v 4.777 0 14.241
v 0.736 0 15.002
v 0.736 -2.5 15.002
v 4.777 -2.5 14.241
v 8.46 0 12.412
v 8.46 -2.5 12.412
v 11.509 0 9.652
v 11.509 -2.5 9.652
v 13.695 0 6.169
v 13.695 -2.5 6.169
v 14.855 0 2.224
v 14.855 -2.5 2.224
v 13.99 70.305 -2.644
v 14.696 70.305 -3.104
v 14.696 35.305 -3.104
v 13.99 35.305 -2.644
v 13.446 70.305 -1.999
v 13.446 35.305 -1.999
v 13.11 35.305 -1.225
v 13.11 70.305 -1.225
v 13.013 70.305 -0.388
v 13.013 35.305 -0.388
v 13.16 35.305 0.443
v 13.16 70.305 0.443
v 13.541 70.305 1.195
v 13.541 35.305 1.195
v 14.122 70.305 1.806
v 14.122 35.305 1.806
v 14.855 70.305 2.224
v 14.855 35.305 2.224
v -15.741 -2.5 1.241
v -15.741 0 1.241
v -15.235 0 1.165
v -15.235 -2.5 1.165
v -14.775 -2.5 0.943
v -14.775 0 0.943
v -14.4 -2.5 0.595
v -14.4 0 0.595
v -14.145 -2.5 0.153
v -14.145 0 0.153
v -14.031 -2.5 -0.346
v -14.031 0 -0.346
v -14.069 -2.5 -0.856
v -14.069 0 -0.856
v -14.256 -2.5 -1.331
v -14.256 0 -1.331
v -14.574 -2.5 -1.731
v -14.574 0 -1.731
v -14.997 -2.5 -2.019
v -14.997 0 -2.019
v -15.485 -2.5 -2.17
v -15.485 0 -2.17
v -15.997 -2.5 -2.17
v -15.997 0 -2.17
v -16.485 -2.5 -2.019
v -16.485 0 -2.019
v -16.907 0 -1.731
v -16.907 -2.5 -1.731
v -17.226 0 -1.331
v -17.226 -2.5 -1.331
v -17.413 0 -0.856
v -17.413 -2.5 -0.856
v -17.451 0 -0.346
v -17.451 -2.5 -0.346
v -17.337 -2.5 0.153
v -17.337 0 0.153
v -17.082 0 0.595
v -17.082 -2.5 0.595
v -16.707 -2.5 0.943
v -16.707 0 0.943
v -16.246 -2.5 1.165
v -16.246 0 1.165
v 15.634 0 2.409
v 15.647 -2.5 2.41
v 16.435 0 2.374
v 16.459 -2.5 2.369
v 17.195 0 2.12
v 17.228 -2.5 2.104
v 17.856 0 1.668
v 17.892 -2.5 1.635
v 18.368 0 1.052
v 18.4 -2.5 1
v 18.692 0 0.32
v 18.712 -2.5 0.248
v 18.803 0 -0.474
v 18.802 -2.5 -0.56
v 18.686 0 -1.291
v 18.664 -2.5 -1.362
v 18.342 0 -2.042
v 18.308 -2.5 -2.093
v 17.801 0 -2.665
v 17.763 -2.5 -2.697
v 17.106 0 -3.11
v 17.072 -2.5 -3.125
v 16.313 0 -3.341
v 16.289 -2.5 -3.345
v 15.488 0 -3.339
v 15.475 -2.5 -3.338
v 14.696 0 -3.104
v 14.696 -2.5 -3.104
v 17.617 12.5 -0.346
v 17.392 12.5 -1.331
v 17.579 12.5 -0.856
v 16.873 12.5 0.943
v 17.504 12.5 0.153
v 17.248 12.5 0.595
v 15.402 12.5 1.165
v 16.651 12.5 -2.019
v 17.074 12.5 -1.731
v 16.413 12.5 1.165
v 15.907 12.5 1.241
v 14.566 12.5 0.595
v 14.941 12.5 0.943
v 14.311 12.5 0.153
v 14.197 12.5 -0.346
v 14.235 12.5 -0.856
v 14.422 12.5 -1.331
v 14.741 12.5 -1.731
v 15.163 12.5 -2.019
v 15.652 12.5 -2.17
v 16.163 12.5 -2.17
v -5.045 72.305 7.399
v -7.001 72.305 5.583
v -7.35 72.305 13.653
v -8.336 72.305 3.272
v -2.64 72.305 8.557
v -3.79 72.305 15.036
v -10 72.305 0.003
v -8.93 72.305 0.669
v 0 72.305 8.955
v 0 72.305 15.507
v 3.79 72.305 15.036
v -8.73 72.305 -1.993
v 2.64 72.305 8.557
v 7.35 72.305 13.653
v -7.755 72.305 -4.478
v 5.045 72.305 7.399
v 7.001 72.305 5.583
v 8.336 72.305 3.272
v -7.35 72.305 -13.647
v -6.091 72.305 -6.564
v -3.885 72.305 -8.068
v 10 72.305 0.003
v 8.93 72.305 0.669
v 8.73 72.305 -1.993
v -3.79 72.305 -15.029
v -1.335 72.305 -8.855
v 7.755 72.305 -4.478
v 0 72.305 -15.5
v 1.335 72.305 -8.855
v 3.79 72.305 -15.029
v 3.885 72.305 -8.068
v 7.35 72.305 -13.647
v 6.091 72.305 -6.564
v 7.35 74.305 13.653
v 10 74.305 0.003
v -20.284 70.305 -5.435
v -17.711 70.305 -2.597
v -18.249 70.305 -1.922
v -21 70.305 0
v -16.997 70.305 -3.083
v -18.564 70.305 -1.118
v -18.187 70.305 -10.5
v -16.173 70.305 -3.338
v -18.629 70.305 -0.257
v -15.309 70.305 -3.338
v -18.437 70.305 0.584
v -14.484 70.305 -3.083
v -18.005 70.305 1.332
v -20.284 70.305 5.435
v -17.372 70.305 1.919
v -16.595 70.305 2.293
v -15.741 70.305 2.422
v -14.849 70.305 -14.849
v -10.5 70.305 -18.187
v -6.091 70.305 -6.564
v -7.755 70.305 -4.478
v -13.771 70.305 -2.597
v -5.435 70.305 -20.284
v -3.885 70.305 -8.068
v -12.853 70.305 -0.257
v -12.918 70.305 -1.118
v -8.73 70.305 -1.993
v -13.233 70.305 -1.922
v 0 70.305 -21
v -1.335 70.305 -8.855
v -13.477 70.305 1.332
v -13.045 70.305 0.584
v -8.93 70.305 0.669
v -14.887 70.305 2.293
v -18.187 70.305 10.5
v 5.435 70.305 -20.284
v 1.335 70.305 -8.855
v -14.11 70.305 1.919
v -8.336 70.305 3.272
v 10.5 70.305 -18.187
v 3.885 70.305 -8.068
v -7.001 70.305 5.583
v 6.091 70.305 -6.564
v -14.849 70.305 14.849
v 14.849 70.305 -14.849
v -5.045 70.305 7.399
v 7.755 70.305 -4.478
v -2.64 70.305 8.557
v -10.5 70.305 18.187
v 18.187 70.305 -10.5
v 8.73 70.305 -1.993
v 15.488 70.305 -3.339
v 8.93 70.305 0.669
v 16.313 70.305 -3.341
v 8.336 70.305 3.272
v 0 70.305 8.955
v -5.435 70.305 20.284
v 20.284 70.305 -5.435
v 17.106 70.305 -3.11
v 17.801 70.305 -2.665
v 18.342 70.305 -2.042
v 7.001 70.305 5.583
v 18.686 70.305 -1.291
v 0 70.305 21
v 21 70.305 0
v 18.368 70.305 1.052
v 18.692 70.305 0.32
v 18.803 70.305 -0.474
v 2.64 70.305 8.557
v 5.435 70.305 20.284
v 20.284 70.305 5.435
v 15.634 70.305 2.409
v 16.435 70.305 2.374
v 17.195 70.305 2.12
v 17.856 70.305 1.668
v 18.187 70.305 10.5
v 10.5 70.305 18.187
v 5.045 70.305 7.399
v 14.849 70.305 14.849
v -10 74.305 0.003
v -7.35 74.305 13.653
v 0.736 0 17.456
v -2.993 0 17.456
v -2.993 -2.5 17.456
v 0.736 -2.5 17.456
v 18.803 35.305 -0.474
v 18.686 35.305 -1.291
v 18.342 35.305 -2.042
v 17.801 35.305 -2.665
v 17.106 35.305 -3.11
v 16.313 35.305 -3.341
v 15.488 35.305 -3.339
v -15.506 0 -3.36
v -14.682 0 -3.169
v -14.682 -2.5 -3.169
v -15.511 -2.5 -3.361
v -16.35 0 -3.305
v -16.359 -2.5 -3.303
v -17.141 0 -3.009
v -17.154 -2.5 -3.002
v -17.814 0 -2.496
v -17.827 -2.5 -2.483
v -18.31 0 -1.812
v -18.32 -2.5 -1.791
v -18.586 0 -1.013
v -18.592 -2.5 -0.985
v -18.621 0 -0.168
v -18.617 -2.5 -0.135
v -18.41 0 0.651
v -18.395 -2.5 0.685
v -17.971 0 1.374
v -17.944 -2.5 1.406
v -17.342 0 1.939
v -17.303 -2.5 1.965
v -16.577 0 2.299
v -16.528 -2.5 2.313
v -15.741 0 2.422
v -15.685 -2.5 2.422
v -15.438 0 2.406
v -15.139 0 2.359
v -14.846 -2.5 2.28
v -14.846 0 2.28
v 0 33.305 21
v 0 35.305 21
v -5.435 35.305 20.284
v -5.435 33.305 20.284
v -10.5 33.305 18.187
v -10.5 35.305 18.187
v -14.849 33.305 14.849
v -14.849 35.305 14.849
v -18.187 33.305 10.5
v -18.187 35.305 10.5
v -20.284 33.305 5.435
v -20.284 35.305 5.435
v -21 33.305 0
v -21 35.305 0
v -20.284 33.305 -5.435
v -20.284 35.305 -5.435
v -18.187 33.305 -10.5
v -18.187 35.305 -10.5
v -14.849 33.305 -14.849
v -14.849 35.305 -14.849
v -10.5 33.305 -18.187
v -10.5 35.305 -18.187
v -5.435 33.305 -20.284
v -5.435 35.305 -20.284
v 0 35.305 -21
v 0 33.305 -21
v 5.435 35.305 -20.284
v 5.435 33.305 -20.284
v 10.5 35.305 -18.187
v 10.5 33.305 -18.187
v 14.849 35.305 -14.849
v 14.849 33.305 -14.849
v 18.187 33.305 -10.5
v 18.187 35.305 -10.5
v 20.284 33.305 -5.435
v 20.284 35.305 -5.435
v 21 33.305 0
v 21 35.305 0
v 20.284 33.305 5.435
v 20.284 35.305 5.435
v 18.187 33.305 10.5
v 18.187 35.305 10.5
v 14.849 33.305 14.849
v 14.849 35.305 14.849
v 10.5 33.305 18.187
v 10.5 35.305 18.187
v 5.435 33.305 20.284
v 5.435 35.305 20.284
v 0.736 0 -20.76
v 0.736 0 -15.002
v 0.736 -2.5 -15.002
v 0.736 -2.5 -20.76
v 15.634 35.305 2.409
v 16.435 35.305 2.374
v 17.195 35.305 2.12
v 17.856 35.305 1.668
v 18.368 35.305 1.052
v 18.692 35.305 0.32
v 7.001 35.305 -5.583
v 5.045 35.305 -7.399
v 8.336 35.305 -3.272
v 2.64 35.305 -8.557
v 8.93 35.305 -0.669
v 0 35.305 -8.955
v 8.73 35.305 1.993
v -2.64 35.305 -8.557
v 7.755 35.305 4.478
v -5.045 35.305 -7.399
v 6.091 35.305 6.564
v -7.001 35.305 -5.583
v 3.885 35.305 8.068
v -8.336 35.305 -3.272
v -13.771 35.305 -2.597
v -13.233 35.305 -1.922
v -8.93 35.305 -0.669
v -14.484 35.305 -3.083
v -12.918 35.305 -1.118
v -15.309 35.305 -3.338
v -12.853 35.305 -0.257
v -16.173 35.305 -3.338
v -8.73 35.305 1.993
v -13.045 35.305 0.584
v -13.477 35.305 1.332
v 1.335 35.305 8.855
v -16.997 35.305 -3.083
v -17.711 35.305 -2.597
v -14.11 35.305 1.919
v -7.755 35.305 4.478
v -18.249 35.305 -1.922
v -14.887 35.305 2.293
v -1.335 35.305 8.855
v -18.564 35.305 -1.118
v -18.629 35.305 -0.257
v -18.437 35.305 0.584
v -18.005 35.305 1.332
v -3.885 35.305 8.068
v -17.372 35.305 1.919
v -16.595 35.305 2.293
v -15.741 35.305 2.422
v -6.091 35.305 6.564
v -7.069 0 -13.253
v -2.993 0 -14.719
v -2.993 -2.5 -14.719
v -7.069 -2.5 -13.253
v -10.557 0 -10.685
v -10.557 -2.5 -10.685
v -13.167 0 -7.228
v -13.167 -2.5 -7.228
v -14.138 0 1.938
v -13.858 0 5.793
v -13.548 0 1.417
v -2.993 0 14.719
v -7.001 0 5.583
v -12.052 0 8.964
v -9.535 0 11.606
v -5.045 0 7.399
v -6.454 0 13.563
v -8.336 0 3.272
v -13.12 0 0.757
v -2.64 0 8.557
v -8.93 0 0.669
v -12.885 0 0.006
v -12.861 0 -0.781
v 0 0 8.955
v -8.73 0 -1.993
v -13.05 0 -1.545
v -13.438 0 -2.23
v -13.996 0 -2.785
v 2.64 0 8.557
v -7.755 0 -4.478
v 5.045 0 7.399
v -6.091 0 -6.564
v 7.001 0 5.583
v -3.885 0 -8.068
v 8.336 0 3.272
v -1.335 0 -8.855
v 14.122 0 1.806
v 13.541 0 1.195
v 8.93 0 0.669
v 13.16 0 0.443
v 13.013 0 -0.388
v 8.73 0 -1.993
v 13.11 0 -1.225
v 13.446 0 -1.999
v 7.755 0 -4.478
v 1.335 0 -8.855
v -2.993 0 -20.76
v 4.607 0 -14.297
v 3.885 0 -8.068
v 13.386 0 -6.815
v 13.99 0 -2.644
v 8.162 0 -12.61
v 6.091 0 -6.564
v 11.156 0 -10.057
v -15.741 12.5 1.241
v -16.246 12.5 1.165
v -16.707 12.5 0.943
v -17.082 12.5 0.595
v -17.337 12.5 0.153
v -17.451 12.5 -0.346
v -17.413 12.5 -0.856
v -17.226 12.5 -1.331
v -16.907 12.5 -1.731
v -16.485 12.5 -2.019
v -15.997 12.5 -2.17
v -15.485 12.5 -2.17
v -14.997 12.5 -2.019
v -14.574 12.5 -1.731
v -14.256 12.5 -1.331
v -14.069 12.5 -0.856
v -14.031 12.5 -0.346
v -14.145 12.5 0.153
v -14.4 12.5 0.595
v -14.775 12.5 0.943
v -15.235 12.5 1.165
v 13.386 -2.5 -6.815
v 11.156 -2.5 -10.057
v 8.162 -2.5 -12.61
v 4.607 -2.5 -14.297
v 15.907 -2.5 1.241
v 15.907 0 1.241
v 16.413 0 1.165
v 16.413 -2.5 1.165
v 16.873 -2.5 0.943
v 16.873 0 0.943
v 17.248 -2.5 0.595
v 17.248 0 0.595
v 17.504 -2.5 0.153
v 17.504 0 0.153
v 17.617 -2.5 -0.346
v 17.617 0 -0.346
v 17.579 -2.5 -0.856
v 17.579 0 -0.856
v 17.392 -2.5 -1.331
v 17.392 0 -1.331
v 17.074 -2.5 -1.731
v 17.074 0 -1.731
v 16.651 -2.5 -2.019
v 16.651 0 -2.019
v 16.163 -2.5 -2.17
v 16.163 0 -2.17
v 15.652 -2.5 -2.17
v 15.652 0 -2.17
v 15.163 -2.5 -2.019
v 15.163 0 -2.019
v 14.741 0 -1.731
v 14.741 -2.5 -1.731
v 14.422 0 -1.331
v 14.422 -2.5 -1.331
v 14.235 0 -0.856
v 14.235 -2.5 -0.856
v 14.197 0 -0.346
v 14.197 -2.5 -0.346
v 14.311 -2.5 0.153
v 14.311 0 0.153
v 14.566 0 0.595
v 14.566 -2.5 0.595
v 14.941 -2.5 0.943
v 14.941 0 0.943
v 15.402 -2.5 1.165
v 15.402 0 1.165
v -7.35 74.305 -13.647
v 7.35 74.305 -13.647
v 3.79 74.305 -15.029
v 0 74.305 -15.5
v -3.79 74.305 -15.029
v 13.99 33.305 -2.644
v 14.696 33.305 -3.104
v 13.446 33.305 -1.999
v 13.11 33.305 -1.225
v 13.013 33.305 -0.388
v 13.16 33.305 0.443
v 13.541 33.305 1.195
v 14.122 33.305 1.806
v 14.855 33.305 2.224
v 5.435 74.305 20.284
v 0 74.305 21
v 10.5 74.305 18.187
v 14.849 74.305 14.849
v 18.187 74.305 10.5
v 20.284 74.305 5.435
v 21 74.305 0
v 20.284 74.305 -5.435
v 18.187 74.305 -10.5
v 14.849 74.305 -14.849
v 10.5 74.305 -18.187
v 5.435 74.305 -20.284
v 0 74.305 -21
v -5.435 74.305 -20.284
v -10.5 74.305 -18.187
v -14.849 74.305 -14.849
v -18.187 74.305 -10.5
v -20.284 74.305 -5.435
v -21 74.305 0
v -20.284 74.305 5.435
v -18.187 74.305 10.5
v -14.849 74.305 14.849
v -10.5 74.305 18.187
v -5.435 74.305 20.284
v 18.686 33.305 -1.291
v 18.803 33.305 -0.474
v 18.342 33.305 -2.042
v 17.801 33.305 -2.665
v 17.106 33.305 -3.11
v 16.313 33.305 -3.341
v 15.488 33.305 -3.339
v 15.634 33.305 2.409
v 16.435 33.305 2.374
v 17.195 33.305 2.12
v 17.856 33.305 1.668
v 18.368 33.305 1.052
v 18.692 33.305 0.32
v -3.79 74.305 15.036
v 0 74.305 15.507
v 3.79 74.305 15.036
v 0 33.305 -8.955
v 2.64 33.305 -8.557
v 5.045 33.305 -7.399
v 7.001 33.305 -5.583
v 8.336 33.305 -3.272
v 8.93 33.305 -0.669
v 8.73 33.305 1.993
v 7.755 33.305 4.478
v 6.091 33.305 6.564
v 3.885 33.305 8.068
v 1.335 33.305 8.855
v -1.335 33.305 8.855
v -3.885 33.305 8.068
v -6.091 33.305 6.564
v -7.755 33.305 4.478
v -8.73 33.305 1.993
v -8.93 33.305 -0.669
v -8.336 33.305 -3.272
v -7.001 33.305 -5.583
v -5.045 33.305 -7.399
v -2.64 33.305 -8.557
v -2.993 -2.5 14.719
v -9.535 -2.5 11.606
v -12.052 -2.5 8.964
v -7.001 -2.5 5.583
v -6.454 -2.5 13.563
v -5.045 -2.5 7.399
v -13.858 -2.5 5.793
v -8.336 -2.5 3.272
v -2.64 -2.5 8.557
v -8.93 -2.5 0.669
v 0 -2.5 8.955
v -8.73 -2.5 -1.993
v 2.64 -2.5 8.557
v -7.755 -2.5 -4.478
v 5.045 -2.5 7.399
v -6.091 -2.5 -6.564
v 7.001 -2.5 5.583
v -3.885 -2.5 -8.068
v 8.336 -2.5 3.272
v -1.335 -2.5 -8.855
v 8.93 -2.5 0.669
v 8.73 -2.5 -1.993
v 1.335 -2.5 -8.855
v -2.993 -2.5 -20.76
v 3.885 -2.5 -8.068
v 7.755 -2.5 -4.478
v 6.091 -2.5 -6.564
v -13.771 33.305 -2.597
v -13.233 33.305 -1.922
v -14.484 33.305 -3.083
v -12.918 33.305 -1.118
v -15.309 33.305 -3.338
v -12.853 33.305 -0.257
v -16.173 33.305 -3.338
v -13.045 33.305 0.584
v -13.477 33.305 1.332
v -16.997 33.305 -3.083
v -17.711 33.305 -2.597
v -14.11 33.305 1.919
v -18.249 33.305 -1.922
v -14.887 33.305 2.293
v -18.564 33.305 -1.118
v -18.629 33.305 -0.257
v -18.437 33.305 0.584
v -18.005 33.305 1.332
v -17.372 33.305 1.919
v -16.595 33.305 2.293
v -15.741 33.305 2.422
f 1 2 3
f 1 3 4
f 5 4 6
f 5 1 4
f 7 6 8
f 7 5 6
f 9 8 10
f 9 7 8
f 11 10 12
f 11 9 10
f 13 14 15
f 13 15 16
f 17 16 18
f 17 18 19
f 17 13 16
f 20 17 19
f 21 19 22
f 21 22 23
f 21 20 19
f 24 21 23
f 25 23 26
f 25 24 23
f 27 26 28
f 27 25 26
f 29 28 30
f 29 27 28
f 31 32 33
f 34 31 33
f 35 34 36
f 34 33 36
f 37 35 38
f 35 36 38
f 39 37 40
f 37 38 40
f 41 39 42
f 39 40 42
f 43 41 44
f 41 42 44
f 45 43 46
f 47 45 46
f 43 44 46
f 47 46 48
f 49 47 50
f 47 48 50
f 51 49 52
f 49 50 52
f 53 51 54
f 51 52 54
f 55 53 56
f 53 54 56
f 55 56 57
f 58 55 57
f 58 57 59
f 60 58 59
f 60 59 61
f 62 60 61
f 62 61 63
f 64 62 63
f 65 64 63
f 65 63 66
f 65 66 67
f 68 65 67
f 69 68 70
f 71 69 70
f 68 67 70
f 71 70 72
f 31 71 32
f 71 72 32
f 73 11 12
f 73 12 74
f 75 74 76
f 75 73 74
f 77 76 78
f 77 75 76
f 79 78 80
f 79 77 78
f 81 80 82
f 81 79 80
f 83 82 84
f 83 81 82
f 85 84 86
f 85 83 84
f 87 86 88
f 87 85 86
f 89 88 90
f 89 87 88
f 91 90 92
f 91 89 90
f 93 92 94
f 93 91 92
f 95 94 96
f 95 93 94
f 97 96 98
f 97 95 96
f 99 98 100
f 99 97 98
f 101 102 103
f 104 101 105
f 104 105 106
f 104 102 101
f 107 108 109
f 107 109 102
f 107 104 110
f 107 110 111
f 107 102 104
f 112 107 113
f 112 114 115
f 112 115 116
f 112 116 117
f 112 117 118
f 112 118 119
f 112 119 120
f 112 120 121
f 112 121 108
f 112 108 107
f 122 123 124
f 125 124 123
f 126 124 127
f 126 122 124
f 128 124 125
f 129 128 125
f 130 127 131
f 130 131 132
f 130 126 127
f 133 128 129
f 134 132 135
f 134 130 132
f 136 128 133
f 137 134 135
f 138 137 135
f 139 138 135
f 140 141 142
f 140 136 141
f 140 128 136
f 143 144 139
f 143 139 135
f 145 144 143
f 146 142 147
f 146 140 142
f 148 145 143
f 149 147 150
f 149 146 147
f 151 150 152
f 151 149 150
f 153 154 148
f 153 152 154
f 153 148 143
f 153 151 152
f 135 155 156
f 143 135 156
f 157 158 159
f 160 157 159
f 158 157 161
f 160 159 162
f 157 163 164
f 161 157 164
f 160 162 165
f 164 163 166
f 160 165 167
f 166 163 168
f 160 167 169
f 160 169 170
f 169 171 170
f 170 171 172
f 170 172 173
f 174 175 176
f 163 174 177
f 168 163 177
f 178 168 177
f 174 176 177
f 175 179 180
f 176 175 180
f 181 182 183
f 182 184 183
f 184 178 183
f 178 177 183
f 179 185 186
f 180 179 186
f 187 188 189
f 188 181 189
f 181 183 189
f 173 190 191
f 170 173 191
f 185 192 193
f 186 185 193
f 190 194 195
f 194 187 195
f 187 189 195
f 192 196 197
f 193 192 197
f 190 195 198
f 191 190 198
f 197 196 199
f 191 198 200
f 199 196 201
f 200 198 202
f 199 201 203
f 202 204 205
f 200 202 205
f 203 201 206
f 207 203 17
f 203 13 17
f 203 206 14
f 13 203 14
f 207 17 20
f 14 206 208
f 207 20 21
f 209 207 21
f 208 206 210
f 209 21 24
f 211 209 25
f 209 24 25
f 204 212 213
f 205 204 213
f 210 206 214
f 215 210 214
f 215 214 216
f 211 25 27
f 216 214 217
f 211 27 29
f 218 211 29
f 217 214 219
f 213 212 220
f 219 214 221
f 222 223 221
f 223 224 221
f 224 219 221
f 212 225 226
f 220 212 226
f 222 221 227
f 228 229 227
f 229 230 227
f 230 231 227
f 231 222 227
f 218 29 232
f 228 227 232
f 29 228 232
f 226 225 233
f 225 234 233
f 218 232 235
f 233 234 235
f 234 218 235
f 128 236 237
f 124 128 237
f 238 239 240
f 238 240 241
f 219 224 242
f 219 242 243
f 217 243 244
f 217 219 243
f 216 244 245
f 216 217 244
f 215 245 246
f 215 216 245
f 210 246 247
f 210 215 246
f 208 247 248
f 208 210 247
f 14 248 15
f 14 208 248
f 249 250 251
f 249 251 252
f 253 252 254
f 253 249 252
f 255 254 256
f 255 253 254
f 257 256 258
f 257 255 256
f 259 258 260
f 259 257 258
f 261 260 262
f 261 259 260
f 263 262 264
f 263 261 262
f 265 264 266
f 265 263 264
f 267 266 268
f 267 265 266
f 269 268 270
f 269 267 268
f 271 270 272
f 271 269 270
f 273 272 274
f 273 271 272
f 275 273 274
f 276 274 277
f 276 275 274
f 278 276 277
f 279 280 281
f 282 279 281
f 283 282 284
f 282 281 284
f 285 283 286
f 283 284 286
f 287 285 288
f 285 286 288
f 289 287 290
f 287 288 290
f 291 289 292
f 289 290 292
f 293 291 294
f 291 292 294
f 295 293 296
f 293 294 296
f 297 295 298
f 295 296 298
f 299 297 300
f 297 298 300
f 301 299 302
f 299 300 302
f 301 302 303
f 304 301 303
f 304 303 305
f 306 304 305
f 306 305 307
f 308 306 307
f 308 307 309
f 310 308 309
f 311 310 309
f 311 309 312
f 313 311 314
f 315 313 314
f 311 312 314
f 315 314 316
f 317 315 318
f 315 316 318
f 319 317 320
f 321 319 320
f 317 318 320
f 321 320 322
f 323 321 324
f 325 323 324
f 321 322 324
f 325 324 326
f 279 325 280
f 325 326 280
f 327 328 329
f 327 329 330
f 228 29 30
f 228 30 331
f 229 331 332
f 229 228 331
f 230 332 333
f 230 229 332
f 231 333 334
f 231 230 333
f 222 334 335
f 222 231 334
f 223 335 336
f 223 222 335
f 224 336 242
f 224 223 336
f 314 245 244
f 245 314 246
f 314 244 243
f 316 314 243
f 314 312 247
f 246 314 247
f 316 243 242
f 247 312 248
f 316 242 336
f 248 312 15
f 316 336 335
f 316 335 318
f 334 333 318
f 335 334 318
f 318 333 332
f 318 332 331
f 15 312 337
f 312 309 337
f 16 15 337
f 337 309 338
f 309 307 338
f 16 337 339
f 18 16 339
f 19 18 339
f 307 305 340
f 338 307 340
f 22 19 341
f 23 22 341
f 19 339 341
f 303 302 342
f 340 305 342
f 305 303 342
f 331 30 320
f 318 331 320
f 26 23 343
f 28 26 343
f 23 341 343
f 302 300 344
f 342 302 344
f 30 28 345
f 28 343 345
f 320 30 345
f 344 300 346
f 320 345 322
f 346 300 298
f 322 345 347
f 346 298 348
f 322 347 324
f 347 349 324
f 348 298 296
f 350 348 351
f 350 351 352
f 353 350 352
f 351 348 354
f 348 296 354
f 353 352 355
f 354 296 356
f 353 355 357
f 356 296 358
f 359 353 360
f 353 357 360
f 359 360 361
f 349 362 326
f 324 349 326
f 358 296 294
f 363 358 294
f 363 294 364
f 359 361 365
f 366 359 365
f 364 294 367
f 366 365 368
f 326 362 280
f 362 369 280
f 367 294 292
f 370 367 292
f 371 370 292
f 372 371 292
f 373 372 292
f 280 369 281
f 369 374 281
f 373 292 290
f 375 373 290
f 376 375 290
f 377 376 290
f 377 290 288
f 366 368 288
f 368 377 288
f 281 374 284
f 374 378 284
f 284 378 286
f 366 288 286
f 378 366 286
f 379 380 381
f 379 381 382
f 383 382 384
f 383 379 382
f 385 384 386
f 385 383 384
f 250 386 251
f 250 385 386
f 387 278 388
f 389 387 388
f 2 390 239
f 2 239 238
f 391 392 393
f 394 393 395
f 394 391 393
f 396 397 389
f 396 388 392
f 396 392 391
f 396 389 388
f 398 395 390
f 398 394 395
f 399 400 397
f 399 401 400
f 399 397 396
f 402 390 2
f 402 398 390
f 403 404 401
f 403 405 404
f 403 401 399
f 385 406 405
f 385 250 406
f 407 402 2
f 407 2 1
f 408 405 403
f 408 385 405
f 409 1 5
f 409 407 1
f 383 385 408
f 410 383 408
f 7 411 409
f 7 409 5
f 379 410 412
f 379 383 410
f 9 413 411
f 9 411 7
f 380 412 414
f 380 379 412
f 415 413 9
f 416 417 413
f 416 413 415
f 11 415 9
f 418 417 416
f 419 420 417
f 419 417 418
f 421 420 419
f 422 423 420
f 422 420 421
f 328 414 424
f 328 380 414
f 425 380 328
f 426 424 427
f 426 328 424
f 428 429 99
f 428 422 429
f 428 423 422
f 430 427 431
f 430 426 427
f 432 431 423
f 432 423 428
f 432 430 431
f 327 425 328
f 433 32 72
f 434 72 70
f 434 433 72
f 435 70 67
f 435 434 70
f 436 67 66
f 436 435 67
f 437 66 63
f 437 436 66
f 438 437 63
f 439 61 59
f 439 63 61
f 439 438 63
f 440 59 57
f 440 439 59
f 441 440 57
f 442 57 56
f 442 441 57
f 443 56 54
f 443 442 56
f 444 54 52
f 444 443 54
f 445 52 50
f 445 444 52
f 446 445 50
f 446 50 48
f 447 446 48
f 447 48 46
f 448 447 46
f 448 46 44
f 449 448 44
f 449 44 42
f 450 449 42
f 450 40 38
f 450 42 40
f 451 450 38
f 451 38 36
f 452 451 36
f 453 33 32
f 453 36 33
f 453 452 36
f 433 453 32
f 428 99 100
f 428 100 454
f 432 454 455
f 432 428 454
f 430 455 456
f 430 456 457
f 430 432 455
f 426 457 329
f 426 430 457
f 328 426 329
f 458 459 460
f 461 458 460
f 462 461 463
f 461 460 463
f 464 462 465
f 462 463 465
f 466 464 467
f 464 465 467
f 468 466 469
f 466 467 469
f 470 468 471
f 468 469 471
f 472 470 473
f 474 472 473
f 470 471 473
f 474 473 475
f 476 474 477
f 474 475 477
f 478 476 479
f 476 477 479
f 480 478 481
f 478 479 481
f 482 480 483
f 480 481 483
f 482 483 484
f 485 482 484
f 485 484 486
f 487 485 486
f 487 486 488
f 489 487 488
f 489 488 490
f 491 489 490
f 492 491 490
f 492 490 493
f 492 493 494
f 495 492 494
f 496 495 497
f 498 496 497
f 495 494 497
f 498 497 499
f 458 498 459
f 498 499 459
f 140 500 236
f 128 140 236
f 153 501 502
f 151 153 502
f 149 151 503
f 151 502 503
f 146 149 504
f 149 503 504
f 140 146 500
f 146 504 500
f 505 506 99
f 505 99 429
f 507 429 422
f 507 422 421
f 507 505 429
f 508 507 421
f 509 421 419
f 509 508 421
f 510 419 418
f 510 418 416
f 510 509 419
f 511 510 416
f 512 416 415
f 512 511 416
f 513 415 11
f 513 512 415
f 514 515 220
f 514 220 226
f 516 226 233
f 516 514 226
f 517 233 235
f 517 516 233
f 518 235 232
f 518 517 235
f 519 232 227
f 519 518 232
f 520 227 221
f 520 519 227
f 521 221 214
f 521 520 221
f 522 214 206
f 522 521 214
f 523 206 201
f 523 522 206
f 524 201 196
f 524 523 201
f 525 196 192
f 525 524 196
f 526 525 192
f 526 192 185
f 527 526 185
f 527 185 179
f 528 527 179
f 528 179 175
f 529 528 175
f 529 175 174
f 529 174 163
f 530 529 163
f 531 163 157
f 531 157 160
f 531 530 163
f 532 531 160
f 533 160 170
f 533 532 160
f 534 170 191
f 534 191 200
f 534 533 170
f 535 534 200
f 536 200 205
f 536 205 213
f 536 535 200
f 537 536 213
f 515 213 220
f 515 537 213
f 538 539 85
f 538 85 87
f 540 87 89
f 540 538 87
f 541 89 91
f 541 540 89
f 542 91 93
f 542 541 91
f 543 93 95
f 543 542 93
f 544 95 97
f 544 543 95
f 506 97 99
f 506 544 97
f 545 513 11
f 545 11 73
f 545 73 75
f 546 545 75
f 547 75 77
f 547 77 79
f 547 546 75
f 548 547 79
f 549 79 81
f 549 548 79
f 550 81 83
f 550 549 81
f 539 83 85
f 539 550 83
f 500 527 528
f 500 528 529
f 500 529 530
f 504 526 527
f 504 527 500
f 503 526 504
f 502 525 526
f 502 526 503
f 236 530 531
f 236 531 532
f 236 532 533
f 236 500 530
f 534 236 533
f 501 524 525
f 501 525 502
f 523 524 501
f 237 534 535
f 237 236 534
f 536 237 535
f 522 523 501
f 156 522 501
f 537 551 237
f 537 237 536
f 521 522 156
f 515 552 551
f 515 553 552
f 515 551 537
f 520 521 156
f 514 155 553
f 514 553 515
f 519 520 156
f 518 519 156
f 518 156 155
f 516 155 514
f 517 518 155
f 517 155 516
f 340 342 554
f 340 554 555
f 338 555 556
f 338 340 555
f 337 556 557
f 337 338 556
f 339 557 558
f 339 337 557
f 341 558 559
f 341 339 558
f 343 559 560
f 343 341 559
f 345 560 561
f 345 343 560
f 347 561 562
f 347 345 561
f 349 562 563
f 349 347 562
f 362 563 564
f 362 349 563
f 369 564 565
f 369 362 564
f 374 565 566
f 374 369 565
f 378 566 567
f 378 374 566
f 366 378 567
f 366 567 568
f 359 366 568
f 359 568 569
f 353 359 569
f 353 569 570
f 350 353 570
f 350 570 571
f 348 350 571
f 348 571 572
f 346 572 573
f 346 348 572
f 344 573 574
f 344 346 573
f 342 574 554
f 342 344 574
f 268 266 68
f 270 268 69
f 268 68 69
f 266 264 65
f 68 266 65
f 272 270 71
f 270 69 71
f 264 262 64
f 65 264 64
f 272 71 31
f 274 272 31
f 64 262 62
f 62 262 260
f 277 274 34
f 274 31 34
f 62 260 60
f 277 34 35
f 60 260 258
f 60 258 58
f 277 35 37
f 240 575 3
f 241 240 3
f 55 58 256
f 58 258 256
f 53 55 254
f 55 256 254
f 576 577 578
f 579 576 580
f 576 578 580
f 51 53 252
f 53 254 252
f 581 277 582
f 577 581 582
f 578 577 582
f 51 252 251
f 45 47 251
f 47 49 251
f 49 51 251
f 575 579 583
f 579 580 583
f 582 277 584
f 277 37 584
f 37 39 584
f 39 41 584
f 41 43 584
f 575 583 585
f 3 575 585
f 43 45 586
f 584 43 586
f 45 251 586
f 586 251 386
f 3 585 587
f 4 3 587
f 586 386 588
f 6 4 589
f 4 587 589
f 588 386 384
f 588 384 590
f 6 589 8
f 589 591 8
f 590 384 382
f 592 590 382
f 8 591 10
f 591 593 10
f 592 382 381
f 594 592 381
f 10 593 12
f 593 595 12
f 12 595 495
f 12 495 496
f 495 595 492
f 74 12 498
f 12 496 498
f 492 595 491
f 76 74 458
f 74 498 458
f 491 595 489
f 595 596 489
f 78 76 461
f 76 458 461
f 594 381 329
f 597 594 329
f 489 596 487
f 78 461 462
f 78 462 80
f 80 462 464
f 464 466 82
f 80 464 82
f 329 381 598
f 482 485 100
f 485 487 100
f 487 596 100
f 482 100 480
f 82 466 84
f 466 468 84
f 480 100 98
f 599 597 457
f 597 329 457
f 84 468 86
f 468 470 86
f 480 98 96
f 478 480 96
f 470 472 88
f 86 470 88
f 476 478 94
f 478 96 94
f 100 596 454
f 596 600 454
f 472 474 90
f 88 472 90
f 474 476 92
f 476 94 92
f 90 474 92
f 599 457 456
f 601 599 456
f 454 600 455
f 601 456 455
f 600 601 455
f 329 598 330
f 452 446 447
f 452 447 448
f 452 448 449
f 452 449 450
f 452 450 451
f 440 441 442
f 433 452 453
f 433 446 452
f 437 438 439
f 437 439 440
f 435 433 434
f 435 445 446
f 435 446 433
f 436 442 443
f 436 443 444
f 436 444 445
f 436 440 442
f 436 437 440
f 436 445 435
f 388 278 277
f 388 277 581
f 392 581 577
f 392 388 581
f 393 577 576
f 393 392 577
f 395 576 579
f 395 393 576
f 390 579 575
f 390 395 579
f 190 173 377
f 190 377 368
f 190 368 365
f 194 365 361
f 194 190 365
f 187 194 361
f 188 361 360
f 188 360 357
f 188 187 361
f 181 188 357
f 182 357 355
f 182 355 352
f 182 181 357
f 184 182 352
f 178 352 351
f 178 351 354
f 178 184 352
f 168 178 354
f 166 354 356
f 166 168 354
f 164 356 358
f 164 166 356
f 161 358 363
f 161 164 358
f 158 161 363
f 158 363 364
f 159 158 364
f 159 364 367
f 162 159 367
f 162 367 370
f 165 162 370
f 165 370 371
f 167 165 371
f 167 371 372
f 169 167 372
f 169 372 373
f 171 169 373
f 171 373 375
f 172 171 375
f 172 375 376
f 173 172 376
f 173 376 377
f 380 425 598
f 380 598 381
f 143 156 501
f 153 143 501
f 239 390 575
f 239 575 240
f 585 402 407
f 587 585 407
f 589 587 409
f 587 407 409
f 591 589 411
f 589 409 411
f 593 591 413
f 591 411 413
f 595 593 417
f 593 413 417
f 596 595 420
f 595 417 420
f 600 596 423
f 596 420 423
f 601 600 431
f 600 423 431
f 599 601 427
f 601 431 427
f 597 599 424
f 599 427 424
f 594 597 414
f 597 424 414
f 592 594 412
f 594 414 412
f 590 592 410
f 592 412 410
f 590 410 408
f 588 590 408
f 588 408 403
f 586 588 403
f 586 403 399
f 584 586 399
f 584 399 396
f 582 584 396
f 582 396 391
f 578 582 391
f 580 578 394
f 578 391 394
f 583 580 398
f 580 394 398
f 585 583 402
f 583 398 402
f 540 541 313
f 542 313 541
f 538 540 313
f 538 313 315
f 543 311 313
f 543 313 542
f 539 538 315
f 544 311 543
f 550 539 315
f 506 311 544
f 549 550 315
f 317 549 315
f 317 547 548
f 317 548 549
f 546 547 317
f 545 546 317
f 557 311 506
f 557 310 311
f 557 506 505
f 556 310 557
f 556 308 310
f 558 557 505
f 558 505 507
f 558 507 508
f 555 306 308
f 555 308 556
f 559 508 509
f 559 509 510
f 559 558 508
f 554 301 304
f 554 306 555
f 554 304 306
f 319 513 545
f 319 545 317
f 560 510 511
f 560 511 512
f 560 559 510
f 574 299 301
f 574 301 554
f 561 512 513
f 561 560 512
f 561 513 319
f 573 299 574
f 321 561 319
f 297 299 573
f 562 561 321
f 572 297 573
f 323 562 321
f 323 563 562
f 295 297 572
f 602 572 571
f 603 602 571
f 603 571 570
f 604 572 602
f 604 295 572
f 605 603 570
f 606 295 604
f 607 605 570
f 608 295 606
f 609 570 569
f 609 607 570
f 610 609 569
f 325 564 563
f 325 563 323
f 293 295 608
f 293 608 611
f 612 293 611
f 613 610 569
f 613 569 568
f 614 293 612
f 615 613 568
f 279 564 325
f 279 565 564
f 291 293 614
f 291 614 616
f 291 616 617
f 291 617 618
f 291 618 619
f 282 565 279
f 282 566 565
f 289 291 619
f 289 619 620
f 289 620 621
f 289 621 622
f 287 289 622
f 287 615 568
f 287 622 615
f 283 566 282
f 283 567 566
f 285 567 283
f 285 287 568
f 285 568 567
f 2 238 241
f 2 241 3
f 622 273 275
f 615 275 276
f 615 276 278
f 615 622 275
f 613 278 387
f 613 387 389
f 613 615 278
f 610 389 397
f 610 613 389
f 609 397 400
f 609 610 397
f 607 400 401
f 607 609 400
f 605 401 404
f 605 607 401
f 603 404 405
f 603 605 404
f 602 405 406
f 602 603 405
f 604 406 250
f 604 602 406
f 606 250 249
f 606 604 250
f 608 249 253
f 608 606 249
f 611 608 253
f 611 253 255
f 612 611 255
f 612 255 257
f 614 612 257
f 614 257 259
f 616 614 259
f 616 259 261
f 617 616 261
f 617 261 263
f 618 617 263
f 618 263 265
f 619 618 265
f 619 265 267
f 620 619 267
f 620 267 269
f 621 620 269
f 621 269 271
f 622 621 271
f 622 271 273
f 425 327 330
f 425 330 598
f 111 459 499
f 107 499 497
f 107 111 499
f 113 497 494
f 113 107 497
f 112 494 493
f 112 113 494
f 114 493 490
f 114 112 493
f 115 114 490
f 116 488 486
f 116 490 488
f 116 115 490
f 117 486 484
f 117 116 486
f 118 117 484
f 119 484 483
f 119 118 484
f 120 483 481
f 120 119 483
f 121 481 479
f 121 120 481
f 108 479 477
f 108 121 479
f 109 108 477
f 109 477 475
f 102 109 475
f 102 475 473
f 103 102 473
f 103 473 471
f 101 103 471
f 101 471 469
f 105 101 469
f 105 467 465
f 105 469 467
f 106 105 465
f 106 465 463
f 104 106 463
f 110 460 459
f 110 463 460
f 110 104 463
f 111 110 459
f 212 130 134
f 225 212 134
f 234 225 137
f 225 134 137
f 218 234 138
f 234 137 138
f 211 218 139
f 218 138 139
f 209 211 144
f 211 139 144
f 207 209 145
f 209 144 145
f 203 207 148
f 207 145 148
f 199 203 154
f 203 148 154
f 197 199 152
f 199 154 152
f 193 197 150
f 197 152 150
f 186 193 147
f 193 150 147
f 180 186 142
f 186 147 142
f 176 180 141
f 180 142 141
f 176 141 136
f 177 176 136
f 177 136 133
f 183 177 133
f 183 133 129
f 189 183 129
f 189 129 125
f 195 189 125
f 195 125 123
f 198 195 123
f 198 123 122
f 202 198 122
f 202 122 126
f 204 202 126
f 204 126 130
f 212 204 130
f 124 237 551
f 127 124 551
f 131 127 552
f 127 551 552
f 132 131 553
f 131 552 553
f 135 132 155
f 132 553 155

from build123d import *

# Parameters (mm, degrees)
SKETCH2_R           = 1.715
SKETCH2_R_2         = 8.955
BOSS_EXTRUDE1_DEPTH = 2.5
BOSS_EXTRUDE2_START = 70.305
SKETCH3_R           = 1.715
SKETCH3_R_2         = 2.896004293
BOSS_EXTRUDE2_DEPTH = 70.305
BOSS_EXTRUDE3_START = 4
SKETCH4_R           = 21
SKETCH4_R_2         = 8.955
BOSS_EXTRUDE3_DEPTH = 4
CUT_EXTRUDE1_DEPTH  = 2
SKETCH6_R           = 21
SKETCH6_R_2         = 8.955
BOSS_EXTRUDE4_DEPTH = 2
CUT_EXTRUDE2_START  = -15
SKETCH7_R           = 1.715
CUT_EXTRUDE2_DEPTH  = 15


with BuildPart() as part:
    # Sketch2 → Boss-Extrude1 (new body)
    with BuildSketch(Plane(origin=(0, 0, 0), x_dir=(1, 0, 0), z_dir=(0, 1, 0))):
        with BuildLine():
            ThreePointArc((14.854844323, -2.224127391), (18.801958936, 0.560128045), (14.69610016, 3.104477828))
            ThreePointArc((14.69610016, 3.104477828), (9.742901135, 11.431929845), (0.735551003, 15.002403382))
            Line((0.735551003, 15.002403382), (0.735551003, 20.759778141))
            Line((0.735551003, 20.759778141), (-2.9930124, 20.759778141))
            Line((-2.9930124, 20.759778141), (-2.9930124, 14.719205797))
            ThreePointArc((-2.9930124, 14.719205797), (-10.557124207, 10.684580992), (-14.68222924, 3.169430082))
            ThreePointArc((-14.68222924, 3.169430082), (-18.635653921, 0.561038173), (-14.846301483, -2.280454949))
            ThreePointArc((-14.846301483, -2.280454949), (-10.873863647, -10.362057319), (-2.9930124, -14.719205797))
            Line((-2.9930124, -14.719205797), (-2.9930124, -17.45639334))
            Line((-2.9930124, -17.45639334), (0.735551003, -17.45639334))
            Line((0.735551003, -17.45639334), (0.735551003, -15.002403382))
            ThreePointArc((0.735551003, -15.002403382), (10.078997516, -11.136738821), (14.854844323, -2.224127391))
        make_face()
        with Locations(Location((15.90723889, 0.473891612, 0), (0, 0, 270))):
            Circle(SKETCH2_R, mode=Mode.SUBTRACT)
        with Locations(Location((-15.740961132, 0.473891612, 0), (0, 0, 270))):
            Circle(SKETCH2_R, mode=Mode.SUBTRACT)
        with Locations(Location((0, 0, 0), (0, 0, 270))):
            Circle(SKETCH2_R_2, mode=Mode.SUBTRACT)
    extrude(amount=-BOSS_EXTRUDE1_DEPTH)

    # Sketch3 → Boss-Extrude2 (add)
    # profile 1 of 3: a face of its own
    with BuildSketch(Plane(origin=(0, 0, 0), x_dir=(1, 0, 0), z_dir=(0, 1, 0)).offset(BOSS_EXTRUDE2_START)):
        with BuildLine():
            ThreePointArc((14.854844323, -2.224127391), (17.541114907, -1.917193921), (18.803243183, 0.473891612))
            ThreePointArc((18.803243183, 0.473891612), (17.469189258, 2.912569924), (14.69610016, 3.104477828))
            ThreePointArc((14.69610016, 3.104477828), (13.012518845, 0.387655178), (14.854844323, -2.224127391))
        make_face()
        with Locations(Location((15.90723889, 0.473891612, 0), (0, 0, 270))):
            Circle(SKETCH3_R, mode=Mode.SUBTRACT)
    # profile 2 of 3: a face of its own
    with BuildSketch(Plane(origin=(0, 0, 0), x_dir=(1, 0, 0), z_dir=(0, 1, 0)).offset(BOSS_EXTRUDE2_START)):
        with Locations(Location((15.90723889, 0.473891612, 0), (0, 0, 270))):
            Circle(SKETCH3_R)
    # profile 3 of 3: a face of its own
    with BuildSketch(Plane(origin=(0, 0, 0), x_dir=(1, 0, 0), z_dir=(0, 1, 0)).offset(BOSS_EXTRUDE2_START)):
        with Locations(Location((-15.740961132, 0.473891612, 0), (0, 0, 270))):
            Circle(SKETCH3_R_2)
    extrude(amount=-BOSS_EXTRUDE2_DEPTH)

    # Sketch4 → Boss-Extrude3 (add)
    with BuildSketch(Plane(origin=(0, 70.305, 0), x_dir=(1, 0, 0), z_dir=(0, 1, 0)).offset(BOSS_EXTRUDE3_START)):
        with Locations(Location((0, 0, 0), (0, 0, 270))):
            Circle(SKETCH4_R)
        with Locations(Location((0, 0, 0), (0, 0, 270))):
            Circle(SKETCH4_R_2, mode=Mode.SUBTRACT)
    extrude(amount=-BOSS_EXTRUDE3_DEPTH)

    # Sketch5 → Cut-Extrude1 (cut)
    with BuildSketch(Plane(origin=(0, 74.305, 0), x_dir=(1, 0, 0), z_dir=(0, 1, 0))):
        with BuildLine():
            Line((-7.35, 13.646519703), (-10, -0.003480297))
            Line((-10, -0.003480297), (-7.35, -13.653480297))
            ThreePointArc((-7.35, -13.653480297), (0, -15.506960594), (7.35, -13.653480297))
            Line((7.35, -13.653480297), (10, -0.003480297))
            Line((10, -0.003480297), (7.35, 13.646519703))
            ThreePointArc((7.35, 13.646519703), (0, 15.5), (-7.35, 13.646519703))
        make_face()
    extrude(amount=-CUT_EXTRUDE1_DEPTH, mode=Mode.SUBTRACT)

    # Sketch6 → Boss-Extrude4 (add)
    with BuildSketch(Plane(origin=(0, 35.305, 0), x_dir=(-1, 0, 0), z_dir=(0, -1, 0))):
        with Locations(Location((0, 0, 0), (0, 0, 270))):
            Circle(SKETCH6_R)
        with Locations(Location((0, 0, 0), (0, 0, 90))):
            Circle(SKETCH6_R_2, mode=Mode.SUBTRACT)
    extrude(amount=BOSS_EXTRUDE4_DEPTH)

    # Sketch7 → Cut-Extrude2 (cut)
    with BuildSketch(Plane.XZ.offset(2.5).offset(CUT_EXTRUDE2_START)):
        with Locations(Location((-15.740961132, -0.473891612, 0), (0, 0, 90))):
            Circle(SKETCH7_R)
        with Locations(Location((15.90723889, -0.473891612, 0), (0, 0, 90))):
            Circle(SKETCH7_R)
    extrude(amount=CUT_EXTRUDE2_DEPTH, mode=Mode.SUBTRACT)


solid = part.part
